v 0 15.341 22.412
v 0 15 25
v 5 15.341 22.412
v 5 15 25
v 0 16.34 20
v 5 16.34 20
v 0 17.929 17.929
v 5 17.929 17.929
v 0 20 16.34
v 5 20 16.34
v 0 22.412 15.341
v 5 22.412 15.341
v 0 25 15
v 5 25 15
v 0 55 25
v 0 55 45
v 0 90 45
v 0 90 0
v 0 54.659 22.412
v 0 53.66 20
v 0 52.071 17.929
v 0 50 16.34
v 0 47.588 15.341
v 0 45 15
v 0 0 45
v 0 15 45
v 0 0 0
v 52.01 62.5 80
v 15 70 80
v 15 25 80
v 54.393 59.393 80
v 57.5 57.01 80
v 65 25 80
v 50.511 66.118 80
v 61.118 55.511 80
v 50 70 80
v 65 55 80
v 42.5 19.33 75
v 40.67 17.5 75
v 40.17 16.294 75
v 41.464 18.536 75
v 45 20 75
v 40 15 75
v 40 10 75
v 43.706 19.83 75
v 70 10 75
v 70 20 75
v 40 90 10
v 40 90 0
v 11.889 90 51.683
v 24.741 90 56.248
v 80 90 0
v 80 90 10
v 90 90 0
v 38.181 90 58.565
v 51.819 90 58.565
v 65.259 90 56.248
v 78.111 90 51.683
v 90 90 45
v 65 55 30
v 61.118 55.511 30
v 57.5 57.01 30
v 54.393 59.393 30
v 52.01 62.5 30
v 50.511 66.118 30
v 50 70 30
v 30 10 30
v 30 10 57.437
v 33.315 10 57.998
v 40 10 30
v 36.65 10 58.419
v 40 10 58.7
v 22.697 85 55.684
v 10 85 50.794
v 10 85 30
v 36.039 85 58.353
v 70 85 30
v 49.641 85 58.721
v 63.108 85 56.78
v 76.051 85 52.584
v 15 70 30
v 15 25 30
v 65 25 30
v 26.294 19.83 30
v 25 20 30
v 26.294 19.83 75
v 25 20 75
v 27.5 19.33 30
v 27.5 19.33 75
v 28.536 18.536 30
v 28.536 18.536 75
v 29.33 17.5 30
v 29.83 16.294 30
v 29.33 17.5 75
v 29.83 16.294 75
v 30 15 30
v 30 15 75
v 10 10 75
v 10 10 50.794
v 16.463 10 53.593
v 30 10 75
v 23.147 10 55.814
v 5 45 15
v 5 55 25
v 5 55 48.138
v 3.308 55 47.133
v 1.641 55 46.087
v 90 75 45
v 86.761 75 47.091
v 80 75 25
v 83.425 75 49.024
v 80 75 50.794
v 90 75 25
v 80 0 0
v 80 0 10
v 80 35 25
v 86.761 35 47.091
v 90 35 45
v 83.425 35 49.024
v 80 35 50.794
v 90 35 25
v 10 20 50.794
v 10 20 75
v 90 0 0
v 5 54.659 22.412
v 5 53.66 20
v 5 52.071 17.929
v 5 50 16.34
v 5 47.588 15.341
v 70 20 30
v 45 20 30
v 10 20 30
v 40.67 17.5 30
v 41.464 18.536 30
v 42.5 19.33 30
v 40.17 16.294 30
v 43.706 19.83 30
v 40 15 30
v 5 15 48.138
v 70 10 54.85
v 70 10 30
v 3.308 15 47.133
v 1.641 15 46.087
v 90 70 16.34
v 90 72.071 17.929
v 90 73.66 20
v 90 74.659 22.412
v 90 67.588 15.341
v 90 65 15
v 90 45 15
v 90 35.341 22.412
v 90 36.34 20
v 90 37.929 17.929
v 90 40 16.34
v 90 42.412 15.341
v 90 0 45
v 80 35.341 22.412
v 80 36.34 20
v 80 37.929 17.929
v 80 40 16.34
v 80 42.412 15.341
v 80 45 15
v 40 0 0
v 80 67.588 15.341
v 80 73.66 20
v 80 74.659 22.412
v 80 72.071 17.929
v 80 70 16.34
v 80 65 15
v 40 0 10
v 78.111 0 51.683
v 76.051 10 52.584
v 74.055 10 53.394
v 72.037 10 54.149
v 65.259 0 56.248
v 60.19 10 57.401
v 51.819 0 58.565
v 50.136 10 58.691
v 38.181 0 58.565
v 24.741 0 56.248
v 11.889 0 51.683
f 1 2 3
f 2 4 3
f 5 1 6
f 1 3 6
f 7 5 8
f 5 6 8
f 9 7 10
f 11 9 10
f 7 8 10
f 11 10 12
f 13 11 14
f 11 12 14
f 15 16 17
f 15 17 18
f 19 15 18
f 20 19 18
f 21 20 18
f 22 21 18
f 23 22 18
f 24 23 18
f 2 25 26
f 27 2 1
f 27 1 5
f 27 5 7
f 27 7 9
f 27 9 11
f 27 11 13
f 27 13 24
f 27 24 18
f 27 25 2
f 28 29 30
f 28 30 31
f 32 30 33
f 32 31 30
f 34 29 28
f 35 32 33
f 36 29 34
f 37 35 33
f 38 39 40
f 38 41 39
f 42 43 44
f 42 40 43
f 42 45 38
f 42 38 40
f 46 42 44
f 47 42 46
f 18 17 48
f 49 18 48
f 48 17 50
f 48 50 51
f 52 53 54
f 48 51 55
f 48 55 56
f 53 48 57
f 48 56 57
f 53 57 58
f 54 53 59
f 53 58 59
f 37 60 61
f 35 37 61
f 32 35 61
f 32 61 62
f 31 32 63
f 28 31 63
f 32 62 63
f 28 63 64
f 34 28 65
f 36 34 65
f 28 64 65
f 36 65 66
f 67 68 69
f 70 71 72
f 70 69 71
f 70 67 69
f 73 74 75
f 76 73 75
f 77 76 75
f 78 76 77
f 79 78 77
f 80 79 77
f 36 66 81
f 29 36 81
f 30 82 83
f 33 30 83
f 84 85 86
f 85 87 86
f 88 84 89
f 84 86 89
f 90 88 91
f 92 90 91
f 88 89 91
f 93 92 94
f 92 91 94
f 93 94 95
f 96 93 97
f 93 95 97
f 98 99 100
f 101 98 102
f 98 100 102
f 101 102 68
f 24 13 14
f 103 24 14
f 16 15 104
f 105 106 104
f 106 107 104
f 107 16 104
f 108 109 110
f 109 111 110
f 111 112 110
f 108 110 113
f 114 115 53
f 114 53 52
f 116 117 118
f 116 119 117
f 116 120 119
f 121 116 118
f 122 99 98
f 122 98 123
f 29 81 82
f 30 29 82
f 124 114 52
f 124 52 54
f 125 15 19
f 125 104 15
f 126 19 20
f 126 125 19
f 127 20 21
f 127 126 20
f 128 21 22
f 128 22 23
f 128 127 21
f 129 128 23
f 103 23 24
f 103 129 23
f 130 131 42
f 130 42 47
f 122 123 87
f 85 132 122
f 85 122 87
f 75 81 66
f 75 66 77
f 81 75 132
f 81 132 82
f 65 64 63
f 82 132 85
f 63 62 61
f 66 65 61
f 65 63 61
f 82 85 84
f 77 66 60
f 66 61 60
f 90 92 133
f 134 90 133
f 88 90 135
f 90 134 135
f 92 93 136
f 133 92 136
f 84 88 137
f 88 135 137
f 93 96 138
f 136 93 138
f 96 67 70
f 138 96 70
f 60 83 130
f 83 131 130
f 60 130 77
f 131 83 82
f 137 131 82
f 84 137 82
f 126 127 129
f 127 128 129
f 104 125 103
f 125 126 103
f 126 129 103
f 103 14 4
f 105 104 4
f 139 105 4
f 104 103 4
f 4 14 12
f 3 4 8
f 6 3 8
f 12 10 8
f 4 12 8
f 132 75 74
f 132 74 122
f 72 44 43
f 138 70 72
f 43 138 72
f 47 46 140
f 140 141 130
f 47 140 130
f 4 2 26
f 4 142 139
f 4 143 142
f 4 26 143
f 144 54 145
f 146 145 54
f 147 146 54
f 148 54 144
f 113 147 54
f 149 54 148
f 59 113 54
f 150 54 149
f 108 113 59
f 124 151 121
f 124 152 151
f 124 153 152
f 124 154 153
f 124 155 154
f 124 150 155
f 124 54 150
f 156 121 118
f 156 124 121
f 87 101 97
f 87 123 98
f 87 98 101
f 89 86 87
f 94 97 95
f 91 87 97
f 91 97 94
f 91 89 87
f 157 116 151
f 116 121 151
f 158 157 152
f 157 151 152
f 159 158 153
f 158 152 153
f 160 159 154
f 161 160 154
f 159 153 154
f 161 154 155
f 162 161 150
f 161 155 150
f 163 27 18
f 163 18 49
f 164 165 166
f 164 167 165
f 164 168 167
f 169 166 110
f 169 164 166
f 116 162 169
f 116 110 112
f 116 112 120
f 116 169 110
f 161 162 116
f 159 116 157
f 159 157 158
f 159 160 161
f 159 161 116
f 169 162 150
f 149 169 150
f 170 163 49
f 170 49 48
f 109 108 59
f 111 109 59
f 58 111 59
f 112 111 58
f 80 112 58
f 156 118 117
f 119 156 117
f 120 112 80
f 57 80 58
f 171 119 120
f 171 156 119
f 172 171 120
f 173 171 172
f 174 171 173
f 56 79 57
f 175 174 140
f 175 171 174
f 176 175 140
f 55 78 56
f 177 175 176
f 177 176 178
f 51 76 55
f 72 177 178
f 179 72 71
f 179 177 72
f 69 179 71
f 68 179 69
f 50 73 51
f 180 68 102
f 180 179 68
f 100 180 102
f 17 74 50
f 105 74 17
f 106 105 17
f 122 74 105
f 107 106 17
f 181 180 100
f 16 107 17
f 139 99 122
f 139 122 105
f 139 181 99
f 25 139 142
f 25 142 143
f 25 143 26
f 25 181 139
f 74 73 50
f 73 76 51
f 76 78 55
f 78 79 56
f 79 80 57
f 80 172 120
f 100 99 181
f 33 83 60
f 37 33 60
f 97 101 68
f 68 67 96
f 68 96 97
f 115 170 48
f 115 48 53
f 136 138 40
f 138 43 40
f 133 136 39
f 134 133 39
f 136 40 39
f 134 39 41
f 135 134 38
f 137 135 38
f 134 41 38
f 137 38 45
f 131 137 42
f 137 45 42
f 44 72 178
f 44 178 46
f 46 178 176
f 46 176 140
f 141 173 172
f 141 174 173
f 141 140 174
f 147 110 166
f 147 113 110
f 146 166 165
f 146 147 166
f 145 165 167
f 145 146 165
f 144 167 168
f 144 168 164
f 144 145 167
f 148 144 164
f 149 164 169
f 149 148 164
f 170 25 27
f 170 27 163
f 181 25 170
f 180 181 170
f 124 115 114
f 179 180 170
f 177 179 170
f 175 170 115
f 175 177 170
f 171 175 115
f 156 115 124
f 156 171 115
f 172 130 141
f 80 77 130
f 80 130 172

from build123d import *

# Parameters (mm, degrees)
F1_DEPTH  = 90
F3_W      = 60
F3_H      = 75
F4_DEPTH  = 28.8572172234
F6_DEPTH  = 75
F7_W      = 20
F7_H      = 10
F7_W_2    = 30
F8_DEPTH  = 45
F9_R      = 5
F11_DEPTH = 50
F13_W     = 5
F13_H     = 40
F13_W_2   = 10
F14_DEPTH = 65.001
F15_R     = 10


with BuildPart() as f1:
    # F0 (on Front) → F1 (new body)
    with BuildSketch(Plane.XZ):
        with BuildLine():
            Line((0, 45), (0, 0))
            Line((0, 0), (40, 0))
            Line((40, 0), (40, 10))
            Line((40, 10), (80, 10))
            Line((80, 10), (80, 0))
            Line((80, 0), (90, 0))
            Line((90, 0), (90, 45))
            ThreePointArc((90, 45), (45, 58.8562172234), (0, 45))
        make_face()
    extrude(amount=-F1_DEPTH)

    # F3 (on offset) → F4 (cut, through all)
    with BuildSketch(Plane(origin=(0, 0, 30), x_dir=(1, 0, 0), z_dir=(0, 0, -1))):
        with Locations((40, -47.5)):
            Rectangle(F3_W, F3_H)
    extrude(amount=-F4_DEPTH, mode=Mode.SUBTRACT)

    # F5 (on face) → F6 (cut, through all)
    with BuildSketch(Plane.XZ.offset(-85)):
        Polygon((70, 54.8496379912), (70, 30), (76.658440432, 54.8496379912), align=None)
    extrude(amount=F6_DEPTH, mode=Mode.SUBTRACT)

    # F7 (on face) → F8 (join)
    with BuildSketch(Plane.XY.offset(30)):
        with Locations((20, 15)):
            Rectangle(F7_W, F7_H)
        with Locations((55, 15)):
            Rectangle(F7_W_2, F7_H)
    extrude(amount=F8_DEPTH)

    # F9
    f9_edges = [f1.edges().sort_by_distance(p)[0] for p in [
        (40, 20, 52.5),
        (30, 20, 52.5),
    ]]
    fillet(f9_edges, radius=F9_R)

    # F10 (on face) → F11 (join)
    with BuildSketch(Plane.XY.offset(30)):
        with BuildLine():
            Line((50, 70), (15, 70))
            Line((15, 70), (15, 25))
            Line((15, 25), (65, 25))
            Line((65, 25), (65, 55))
            ThreePointArc((65, 55), (54.3933982822, 59.3933982822), (50, 70))
        make_face()
    extrude(amount=F11_DEPTH)

    # F13 (on offset) → F14 (cut, through all)
    with BuildSketch(Plane(origin=(0, 0, 15), x_dir=(1, 0, 0), z_dir=(0, 0, -1))):
        with Locations((2.5, -35)):
            Rectangle(F13_W, F13_H)
        with Locations((85, -55)):
            Rectangle(F13_W_2, F13_H)
    extrude(amount=-F14_DEPTH, mode=Mode.SUBTRACT)

    # F15
    f15_edges = [f1.edges().sort_by_distance(p)[0] for p in [
        (2.5, 55, 15),
        (2.5, 15, 15),
        (85, 35, 15),
        (85, 75, 15),
    ]]
    fillet(f15_edges, radius=F15_R)


solid = f1.part
